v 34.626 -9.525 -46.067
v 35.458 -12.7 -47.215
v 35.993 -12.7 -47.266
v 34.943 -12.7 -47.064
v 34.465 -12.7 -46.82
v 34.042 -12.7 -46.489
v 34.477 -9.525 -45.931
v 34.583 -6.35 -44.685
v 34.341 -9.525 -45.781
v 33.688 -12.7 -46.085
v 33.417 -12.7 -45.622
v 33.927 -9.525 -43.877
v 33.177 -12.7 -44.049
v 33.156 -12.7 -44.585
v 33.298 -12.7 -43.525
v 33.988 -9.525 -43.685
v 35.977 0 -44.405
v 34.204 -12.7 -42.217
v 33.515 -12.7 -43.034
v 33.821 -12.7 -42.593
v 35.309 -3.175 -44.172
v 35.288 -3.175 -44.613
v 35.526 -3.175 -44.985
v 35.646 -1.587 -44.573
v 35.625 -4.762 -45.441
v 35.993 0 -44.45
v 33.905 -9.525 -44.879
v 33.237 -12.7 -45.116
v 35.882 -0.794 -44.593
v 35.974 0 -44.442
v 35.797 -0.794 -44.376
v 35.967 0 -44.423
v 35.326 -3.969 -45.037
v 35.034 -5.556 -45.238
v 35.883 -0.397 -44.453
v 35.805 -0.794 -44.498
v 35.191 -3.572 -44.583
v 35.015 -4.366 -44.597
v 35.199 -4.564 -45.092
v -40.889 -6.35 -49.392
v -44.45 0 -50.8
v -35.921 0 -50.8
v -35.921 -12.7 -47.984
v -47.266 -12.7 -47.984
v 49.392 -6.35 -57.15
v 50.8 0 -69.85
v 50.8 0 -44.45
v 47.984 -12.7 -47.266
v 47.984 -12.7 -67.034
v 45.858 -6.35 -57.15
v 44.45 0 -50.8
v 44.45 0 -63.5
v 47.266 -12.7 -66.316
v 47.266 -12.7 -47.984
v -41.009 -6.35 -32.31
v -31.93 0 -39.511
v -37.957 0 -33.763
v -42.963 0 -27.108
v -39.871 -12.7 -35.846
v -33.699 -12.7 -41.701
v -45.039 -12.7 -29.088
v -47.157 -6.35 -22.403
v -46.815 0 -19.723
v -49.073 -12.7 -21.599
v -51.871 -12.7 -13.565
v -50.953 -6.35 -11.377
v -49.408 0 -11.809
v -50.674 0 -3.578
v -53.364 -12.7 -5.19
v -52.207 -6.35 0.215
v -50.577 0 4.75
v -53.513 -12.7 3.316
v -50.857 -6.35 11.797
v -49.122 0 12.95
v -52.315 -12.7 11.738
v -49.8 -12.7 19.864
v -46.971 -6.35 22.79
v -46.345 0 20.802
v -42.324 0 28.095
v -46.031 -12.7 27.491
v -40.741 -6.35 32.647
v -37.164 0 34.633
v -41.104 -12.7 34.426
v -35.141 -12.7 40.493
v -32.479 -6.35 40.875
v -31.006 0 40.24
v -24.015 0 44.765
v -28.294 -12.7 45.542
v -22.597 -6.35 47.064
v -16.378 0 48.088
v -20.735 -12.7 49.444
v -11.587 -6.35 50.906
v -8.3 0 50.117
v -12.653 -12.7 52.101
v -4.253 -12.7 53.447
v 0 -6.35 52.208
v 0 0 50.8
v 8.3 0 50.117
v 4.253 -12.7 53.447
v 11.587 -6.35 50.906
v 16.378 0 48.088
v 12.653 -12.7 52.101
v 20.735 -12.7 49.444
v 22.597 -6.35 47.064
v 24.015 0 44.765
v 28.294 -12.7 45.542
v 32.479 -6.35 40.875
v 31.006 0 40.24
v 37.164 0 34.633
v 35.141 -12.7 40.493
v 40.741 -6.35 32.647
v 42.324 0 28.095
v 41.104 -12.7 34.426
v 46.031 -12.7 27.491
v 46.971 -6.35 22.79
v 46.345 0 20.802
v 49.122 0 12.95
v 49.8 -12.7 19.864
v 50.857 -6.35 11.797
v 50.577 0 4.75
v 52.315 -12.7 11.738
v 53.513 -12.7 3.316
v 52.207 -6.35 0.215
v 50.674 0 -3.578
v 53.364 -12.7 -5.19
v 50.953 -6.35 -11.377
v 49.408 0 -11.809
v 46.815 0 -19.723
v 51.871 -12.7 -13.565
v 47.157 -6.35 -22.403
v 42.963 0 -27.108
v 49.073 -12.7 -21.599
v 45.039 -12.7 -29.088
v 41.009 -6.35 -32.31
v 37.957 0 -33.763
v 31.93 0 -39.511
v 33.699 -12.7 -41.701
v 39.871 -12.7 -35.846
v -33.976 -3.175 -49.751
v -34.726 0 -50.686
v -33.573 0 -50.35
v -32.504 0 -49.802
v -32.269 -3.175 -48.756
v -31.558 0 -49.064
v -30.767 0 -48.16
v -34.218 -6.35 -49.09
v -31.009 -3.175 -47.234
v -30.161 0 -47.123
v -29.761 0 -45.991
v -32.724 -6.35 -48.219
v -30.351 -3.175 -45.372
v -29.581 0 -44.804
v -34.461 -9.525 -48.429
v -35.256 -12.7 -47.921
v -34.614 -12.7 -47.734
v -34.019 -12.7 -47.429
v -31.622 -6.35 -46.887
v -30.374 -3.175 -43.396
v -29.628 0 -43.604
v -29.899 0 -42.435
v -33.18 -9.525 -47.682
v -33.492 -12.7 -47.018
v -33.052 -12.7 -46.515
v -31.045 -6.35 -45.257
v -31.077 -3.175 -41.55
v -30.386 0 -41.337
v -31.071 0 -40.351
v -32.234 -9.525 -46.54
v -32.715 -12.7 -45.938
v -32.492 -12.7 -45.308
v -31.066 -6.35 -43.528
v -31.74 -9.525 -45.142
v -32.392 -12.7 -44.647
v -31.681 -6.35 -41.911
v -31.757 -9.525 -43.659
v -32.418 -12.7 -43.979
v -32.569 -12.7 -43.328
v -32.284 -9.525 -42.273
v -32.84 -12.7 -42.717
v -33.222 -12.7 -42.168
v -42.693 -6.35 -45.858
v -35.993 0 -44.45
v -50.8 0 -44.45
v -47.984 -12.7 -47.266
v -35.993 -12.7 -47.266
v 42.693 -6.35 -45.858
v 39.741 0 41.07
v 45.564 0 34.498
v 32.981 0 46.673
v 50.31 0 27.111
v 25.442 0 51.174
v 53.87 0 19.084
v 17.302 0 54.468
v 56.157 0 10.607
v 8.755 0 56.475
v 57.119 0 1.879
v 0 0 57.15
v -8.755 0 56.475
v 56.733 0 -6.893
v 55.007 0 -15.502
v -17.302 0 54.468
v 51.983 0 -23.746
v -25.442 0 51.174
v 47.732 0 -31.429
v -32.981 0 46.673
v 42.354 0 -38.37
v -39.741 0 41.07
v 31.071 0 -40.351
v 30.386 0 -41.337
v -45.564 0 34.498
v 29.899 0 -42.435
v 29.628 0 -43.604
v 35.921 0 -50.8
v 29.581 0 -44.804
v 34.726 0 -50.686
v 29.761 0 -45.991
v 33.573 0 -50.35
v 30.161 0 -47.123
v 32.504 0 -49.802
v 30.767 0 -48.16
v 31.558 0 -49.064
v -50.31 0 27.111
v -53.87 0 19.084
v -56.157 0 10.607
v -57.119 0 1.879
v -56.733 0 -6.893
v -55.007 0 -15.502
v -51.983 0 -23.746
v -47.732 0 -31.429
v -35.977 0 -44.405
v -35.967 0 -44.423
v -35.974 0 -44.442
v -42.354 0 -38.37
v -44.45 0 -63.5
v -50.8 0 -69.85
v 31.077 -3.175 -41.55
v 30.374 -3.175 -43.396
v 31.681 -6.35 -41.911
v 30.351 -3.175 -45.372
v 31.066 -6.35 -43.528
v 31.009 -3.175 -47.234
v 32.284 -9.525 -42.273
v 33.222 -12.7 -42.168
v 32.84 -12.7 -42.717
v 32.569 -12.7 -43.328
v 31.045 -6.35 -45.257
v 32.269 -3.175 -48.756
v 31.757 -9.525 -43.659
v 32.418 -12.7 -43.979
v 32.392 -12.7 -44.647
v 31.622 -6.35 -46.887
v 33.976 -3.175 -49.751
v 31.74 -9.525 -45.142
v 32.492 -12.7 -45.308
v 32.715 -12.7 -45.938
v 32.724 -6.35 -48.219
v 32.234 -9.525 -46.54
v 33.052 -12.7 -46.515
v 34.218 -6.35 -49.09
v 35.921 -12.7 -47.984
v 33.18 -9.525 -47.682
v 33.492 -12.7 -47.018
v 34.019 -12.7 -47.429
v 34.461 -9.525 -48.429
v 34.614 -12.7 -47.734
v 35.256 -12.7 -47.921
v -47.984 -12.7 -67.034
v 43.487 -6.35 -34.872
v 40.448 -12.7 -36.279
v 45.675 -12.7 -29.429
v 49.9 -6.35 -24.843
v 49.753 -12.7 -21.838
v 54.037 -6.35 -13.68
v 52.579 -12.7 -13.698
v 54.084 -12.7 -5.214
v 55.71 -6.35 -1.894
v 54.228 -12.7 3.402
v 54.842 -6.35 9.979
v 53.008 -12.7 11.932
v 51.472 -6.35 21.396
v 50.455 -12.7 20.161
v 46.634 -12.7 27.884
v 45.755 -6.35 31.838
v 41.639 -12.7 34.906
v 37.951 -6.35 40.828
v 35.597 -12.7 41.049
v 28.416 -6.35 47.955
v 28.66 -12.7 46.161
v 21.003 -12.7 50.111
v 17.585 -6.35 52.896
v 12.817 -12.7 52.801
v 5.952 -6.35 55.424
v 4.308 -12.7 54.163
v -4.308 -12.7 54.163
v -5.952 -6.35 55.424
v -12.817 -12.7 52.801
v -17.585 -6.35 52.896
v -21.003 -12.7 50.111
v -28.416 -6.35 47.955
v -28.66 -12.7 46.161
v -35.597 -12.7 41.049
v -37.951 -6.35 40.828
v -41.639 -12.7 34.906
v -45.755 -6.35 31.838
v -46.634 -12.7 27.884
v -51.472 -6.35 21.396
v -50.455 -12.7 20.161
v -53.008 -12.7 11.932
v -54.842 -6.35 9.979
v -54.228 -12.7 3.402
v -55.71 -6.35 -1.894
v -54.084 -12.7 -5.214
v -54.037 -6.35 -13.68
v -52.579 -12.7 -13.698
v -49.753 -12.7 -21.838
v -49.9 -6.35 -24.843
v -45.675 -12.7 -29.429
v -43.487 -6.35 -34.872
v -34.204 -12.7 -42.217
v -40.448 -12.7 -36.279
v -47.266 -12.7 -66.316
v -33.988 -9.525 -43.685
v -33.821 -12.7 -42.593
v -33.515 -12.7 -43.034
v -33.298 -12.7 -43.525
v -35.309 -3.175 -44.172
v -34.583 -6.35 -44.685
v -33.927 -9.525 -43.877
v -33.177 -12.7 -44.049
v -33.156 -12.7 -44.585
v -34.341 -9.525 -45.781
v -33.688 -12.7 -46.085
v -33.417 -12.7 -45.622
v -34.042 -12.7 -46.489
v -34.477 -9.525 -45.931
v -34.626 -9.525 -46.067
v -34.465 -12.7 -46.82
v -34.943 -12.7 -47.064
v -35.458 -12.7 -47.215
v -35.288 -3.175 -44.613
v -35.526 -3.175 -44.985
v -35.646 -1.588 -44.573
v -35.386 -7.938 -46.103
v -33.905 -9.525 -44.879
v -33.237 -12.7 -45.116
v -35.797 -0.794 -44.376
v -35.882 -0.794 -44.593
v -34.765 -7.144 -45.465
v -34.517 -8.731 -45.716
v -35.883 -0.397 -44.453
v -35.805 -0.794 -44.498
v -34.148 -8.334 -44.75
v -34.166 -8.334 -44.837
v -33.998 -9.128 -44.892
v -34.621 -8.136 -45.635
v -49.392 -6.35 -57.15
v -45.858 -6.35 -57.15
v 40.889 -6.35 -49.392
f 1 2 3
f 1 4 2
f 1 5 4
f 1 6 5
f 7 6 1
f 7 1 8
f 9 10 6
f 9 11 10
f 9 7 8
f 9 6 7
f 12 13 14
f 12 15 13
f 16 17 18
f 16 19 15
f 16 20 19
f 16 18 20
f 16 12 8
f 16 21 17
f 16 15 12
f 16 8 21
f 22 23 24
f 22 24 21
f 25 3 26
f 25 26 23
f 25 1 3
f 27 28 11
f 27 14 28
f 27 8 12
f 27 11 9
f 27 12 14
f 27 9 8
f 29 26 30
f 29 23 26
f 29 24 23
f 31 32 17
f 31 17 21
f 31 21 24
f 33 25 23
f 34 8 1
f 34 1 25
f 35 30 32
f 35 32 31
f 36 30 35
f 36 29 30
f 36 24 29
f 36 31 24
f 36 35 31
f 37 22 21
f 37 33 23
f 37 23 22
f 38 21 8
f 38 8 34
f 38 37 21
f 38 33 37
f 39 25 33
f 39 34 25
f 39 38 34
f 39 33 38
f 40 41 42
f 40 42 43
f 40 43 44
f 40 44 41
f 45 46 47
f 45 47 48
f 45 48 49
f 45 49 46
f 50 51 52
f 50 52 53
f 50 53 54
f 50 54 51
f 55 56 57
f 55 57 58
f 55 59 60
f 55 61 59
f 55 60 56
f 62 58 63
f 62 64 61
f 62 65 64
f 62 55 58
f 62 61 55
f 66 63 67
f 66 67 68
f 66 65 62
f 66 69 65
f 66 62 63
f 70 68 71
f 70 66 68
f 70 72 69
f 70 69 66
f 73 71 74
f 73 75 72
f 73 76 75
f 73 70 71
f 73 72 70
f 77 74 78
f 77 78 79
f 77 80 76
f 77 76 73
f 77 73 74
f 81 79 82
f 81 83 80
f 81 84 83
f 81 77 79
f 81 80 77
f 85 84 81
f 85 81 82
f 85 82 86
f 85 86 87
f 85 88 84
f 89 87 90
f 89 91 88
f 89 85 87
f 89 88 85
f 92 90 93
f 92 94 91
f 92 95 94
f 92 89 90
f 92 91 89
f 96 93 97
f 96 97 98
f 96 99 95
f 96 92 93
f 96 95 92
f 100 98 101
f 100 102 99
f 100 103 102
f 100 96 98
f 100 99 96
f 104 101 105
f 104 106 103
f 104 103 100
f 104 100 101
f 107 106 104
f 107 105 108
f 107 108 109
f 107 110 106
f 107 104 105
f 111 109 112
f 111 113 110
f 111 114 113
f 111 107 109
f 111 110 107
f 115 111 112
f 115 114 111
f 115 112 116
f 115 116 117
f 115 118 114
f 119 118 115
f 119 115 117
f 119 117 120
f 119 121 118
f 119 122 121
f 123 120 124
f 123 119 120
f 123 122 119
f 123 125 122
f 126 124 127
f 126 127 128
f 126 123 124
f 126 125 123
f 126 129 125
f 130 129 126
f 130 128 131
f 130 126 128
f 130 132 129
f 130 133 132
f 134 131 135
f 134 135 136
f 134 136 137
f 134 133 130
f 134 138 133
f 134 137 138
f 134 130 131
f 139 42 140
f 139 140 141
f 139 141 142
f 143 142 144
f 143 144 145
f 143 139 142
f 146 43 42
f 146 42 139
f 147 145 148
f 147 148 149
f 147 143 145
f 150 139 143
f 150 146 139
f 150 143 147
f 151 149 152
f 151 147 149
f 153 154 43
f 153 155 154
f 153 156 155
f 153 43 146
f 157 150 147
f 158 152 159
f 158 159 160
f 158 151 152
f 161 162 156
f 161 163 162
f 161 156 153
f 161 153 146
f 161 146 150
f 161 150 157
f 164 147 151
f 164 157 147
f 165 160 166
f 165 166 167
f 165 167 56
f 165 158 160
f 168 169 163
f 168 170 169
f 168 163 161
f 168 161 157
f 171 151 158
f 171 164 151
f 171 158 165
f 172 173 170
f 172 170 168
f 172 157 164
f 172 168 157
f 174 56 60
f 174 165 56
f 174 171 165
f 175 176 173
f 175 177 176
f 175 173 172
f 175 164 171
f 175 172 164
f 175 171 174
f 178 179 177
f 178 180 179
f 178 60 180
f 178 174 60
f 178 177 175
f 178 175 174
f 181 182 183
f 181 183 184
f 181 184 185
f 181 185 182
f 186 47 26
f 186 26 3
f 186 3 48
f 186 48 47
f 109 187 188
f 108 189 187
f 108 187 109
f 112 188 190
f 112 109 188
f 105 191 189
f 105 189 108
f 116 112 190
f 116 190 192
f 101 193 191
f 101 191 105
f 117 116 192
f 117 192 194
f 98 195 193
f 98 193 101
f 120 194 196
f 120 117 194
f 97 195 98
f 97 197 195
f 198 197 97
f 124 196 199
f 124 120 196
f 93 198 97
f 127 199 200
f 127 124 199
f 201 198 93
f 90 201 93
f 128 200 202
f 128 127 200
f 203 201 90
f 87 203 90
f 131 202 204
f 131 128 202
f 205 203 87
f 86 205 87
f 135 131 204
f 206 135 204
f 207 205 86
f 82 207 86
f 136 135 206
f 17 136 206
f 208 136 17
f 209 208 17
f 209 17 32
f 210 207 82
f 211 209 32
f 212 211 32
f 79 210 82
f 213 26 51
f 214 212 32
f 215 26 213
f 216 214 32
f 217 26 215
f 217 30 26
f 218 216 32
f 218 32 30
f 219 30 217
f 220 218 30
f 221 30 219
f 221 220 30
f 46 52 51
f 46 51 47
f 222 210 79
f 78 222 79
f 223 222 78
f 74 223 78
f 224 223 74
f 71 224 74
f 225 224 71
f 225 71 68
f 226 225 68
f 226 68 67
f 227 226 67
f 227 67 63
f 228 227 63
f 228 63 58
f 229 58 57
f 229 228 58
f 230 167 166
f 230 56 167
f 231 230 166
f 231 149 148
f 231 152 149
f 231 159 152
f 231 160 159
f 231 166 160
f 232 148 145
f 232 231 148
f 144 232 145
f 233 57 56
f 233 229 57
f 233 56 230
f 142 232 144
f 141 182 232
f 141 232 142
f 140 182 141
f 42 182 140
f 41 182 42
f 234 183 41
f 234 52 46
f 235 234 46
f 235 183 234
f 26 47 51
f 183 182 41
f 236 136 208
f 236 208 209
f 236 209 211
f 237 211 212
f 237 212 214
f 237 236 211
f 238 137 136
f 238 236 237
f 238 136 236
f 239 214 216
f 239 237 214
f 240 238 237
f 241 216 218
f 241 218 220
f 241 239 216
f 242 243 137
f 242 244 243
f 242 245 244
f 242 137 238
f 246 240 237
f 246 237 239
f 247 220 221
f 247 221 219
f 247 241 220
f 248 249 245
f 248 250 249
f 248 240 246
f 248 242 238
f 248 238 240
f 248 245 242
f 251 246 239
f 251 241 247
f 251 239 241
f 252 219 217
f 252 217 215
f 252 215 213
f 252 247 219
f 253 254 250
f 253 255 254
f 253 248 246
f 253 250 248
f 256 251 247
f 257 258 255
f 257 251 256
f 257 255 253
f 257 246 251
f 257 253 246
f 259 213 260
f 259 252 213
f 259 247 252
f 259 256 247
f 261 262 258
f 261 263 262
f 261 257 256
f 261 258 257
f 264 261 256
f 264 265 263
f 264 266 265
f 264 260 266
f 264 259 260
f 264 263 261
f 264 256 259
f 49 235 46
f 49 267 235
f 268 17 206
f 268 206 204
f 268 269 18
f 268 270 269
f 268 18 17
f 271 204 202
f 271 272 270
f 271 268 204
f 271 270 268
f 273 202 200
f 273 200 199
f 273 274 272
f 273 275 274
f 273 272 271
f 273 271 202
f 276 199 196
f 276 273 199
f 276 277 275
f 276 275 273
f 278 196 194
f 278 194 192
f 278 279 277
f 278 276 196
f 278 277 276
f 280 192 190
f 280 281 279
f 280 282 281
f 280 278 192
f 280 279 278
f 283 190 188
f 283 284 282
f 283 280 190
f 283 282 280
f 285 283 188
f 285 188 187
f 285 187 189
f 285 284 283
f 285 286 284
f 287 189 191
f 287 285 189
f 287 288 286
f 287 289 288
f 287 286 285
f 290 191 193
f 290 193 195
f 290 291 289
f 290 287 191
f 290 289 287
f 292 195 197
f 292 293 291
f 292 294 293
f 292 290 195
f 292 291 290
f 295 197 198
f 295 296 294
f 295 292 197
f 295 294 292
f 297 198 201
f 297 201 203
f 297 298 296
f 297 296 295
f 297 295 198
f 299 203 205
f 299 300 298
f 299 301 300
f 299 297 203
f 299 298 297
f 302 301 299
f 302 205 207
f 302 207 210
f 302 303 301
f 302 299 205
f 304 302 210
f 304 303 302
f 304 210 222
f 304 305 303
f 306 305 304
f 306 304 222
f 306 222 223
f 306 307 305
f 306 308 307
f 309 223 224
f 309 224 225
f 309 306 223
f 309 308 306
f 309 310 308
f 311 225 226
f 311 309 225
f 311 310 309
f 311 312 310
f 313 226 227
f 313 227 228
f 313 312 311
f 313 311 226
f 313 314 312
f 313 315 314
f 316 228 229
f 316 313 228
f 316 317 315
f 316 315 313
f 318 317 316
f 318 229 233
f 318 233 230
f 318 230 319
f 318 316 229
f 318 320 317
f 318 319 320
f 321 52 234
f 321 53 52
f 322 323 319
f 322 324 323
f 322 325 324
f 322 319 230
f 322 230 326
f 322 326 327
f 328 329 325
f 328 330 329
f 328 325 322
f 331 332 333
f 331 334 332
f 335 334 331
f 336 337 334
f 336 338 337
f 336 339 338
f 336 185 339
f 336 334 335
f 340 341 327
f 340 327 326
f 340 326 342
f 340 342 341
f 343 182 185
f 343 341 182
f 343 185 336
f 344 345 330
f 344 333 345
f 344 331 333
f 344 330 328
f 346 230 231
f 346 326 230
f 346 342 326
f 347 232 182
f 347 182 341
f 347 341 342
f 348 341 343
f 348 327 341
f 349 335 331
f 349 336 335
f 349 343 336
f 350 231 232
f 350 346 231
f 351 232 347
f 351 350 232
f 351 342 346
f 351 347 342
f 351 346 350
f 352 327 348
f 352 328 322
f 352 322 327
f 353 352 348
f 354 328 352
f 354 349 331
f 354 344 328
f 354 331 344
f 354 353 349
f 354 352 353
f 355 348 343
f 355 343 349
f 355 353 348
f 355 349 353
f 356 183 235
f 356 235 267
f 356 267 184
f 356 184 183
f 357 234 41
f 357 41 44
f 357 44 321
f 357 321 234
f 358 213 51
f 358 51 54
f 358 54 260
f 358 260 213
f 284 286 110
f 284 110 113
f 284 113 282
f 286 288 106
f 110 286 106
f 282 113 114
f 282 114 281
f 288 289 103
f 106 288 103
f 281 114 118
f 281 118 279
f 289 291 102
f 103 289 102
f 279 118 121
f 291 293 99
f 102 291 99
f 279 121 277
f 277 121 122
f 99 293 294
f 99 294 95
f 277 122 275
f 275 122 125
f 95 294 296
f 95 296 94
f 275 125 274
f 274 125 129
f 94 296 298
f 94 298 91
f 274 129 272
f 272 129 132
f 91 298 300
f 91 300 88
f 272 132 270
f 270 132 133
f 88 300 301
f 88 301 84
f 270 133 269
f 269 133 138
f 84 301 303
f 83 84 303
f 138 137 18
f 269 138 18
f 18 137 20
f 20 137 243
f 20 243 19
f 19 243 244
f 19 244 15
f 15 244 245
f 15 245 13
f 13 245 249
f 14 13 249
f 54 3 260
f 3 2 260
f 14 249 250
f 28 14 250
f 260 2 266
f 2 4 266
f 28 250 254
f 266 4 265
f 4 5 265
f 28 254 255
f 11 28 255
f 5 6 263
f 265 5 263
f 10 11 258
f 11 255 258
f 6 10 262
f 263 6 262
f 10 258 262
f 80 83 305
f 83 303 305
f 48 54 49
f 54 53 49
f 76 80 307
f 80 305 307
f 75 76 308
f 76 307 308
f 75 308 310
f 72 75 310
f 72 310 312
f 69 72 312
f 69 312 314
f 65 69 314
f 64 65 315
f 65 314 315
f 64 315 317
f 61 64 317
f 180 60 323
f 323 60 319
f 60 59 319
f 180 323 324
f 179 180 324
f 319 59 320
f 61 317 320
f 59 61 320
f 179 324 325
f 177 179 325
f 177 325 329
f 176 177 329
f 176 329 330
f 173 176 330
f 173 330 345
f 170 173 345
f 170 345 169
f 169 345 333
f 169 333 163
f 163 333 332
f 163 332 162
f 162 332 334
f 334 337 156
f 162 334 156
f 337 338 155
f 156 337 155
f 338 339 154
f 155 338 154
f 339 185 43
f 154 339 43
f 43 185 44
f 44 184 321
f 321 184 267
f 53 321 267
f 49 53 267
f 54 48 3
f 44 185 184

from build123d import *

# Parameters (mm, degrees)
F1_DEPTH = 12.7
F1_TAPER = 12.5


with BuildPart() as f1:
    # F0 (on Front) → F1 (new body)
    with BuildSketch(Plane.XZ):
        with BuildLine():
            Line((50.8, -44.45), (35.9927948345, -44.45))
            ThreePointArc((35.9927948345, -44.45), (35.9688528047, -44.4330816985), (35.9768051433, -44.4048645047))
            ThreePointArc((35.9768051433, -44.4048645047), (0, 57.15), (-35.9768051433, -44.4048645047))
            ThreePointArc((-35.9768051433, -44.4048645047), (-35.9688528047, -44.4330816985), (-35.9927948345, -44.45))
            Line((-35.9927948345, -44.45), (-50.8, -44.45))
            Line((-50.8, -44.45), (-50.8, -69.85))
            Line((-50.8, -69.85), (50.8, -69.85))
            Line((50.8, -69.85), (50.8, -44.45))
        make_face()
        with BuildLine():
            ThreePointArc((-31.9297995416, -39.5111111111), (0, 50.8), (31.9297995416, -39.5111111111))
            ThreePointArc((31.9297995416, -39.5111111111), (29.9341870702, -46.5666666667), (35.9210244843, -50.8))
            Line((35.9210244843, -50.8), (44.45, -50.8))
            Line((44.45, -50.8), (44.45, -63.5))
            Line((44.45, -63.5), (-44.45, -63.5))
            Line((-44.45, -63.5), (-44.45, -50.8))
            Line((-44.45, -50.8), (-35.9210244843, -50.8))
            ThreePointArc((-35.9210244843, -50.8), (-29.9341870702, -46.5666666667), (-31.9297995416, -39.5111111111))
        make_face(mode=Mode.SUBTRACT)
    extrude(amount=F1_DEPTH, taper=F1_TAPER)


solid = f1.part
